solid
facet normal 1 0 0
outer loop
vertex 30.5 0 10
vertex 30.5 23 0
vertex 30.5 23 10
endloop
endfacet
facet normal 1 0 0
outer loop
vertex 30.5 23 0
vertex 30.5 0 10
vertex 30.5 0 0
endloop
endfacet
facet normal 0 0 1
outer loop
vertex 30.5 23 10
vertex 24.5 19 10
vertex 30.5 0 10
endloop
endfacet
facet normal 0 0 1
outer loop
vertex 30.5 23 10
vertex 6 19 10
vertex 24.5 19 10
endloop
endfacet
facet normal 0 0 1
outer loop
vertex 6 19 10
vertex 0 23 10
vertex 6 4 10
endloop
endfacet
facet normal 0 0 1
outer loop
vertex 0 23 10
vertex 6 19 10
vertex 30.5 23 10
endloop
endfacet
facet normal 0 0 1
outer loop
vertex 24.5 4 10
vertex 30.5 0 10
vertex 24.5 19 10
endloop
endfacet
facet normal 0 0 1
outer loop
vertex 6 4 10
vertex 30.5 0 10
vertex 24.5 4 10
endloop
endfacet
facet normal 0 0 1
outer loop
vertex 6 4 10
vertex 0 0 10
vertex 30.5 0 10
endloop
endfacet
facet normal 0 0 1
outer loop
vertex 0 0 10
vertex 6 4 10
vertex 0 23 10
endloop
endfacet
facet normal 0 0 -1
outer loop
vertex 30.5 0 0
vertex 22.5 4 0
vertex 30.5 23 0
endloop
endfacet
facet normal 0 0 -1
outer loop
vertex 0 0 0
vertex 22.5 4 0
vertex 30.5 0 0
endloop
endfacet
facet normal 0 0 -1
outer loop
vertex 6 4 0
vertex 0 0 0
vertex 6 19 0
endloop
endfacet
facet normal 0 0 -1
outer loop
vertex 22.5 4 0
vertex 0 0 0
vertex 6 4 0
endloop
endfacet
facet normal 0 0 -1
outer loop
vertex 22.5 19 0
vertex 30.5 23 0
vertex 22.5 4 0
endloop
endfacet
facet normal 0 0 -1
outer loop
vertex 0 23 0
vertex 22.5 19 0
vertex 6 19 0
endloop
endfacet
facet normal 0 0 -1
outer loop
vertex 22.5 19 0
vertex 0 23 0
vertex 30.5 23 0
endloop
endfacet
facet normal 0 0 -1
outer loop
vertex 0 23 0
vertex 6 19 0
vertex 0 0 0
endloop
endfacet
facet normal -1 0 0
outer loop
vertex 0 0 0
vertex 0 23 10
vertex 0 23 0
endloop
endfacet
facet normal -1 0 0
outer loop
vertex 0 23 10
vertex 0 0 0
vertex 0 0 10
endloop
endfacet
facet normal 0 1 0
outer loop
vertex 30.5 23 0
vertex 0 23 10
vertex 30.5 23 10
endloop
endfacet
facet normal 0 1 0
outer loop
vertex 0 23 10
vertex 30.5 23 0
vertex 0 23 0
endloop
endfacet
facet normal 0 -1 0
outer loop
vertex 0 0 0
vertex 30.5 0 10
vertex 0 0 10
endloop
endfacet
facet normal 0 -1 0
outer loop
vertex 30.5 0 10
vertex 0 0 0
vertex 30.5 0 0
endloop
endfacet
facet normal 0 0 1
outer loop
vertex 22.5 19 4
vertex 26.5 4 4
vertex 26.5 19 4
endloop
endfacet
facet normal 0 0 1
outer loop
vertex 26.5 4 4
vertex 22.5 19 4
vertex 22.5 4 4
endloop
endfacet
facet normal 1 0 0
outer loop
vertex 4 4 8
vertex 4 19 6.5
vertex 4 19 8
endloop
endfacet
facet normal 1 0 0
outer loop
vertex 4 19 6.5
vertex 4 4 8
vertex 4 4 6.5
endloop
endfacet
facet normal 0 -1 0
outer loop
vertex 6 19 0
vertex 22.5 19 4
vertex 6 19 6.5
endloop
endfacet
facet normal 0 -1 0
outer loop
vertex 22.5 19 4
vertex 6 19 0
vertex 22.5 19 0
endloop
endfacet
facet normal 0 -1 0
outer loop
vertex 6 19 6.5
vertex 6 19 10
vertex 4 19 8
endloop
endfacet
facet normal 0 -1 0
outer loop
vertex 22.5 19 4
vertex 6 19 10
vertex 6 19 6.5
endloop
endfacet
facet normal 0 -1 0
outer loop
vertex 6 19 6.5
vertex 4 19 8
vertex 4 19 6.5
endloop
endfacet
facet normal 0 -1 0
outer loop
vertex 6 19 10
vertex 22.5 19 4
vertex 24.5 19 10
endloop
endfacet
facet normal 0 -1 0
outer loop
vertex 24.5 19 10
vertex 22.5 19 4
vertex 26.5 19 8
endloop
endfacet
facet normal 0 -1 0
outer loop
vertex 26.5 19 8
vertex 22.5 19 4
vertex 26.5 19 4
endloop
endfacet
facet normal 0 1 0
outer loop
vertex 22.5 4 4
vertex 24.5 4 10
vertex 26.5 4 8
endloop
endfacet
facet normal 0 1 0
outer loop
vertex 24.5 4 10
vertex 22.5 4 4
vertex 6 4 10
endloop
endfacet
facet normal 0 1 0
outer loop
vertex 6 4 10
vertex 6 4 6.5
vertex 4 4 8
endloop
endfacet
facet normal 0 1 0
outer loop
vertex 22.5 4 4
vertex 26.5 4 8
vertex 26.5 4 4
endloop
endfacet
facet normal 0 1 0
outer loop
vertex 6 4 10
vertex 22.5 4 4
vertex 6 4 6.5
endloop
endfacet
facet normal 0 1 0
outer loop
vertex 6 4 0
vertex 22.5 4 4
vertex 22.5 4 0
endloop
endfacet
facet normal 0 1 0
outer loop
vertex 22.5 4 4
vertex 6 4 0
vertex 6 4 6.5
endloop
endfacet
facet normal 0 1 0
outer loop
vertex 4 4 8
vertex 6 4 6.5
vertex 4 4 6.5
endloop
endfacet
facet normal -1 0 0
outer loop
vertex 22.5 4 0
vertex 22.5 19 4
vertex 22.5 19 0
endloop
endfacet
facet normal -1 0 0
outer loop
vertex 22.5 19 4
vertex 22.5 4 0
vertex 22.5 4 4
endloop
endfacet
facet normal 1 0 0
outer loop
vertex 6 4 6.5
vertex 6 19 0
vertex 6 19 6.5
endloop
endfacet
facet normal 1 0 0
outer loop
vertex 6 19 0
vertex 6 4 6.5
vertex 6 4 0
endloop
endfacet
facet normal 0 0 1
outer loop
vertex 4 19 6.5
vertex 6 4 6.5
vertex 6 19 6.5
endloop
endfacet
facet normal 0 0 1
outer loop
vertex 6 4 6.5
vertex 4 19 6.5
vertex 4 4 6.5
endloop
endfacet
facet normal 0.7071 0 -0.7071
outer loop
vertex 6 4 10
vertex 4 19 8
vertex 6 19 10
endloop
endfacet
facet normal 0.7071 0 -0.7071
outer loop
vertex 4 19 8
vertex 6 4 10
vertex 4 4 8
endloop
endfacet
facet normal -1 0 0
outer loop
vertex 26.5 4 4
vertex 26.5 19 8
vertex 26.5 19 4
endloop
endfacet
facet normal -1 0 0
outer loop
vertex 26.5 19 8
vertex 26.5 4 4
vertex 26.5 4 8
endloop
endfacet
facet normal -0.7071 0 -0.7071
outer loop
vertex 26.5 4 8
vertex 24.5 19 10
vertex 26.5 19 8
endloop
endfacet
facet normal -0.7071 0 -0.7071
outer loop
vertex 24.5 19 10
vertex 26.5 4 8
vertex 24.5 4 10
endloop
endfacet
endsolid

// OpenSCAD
// [FL_INDEX: keywords="openscad, 3d_parametric, Mounting_plate_for_keystone_jack, csg_solid" | COT="Parametric OpenSCAD design from 3DCodeverse"]
// Title: Mounting plate for keystone jack

jack_length =16.5;
jack_width = 15;

wall_height = 10;
wall_thickness = 4;

catch_overhang = 2;

small_clip_depth = catch_overhang;
big_clip_depth = catch_overhang + 2;
big_clip_clearance = 4;
small_clip_clearance = 6.5;

outer_length = jack_length + small_clip_depth + big_clip_depth +
                            (wall_thickness * 2);
outer_width = jack_width + (wall_thickness * 2);


module clip_catch() {
  rotate([90, 0, 0]) {
    linear_extrude(height = outer_width) {
      polygon(points = [[0,0],
                                       [catch_overhang,0],
                                       [wall_thickness,catch_overhang],
                                       [0,catch_overhang]],
                      paths = [[0,1,2,3]]);
    }
  }
}

module keystone() {
union() {

difference() {
  difference() {
    cube([outer_length, outer_width, wall_height]);
   translate([wall_thickness, wall_thickness, big_clip_clearance]) {
      cube([outer_length, jack_width, wall_height]);
    }
  }
  translate([wall_thickness + small_clip_depth, wall_thickness, 0]){
    cube([jack_length, jack_width, wall_height + 1]);
  }
}

cube([wall_thickness, outer_width, wall_height]);

cube([wall_thickness + small_clip_depth,
           outer_width, small_clip_clearance]);

translate([2, 23, 8]) {
  clip_catch();
}

translate([26.5,0,0]) {
  cube([4, 23, 10]);
}

translate([28.5, 0, 8]) {
  rotate([0, 0, -180]) {
    clip_catch();
  }
}


}
}

keystone();
